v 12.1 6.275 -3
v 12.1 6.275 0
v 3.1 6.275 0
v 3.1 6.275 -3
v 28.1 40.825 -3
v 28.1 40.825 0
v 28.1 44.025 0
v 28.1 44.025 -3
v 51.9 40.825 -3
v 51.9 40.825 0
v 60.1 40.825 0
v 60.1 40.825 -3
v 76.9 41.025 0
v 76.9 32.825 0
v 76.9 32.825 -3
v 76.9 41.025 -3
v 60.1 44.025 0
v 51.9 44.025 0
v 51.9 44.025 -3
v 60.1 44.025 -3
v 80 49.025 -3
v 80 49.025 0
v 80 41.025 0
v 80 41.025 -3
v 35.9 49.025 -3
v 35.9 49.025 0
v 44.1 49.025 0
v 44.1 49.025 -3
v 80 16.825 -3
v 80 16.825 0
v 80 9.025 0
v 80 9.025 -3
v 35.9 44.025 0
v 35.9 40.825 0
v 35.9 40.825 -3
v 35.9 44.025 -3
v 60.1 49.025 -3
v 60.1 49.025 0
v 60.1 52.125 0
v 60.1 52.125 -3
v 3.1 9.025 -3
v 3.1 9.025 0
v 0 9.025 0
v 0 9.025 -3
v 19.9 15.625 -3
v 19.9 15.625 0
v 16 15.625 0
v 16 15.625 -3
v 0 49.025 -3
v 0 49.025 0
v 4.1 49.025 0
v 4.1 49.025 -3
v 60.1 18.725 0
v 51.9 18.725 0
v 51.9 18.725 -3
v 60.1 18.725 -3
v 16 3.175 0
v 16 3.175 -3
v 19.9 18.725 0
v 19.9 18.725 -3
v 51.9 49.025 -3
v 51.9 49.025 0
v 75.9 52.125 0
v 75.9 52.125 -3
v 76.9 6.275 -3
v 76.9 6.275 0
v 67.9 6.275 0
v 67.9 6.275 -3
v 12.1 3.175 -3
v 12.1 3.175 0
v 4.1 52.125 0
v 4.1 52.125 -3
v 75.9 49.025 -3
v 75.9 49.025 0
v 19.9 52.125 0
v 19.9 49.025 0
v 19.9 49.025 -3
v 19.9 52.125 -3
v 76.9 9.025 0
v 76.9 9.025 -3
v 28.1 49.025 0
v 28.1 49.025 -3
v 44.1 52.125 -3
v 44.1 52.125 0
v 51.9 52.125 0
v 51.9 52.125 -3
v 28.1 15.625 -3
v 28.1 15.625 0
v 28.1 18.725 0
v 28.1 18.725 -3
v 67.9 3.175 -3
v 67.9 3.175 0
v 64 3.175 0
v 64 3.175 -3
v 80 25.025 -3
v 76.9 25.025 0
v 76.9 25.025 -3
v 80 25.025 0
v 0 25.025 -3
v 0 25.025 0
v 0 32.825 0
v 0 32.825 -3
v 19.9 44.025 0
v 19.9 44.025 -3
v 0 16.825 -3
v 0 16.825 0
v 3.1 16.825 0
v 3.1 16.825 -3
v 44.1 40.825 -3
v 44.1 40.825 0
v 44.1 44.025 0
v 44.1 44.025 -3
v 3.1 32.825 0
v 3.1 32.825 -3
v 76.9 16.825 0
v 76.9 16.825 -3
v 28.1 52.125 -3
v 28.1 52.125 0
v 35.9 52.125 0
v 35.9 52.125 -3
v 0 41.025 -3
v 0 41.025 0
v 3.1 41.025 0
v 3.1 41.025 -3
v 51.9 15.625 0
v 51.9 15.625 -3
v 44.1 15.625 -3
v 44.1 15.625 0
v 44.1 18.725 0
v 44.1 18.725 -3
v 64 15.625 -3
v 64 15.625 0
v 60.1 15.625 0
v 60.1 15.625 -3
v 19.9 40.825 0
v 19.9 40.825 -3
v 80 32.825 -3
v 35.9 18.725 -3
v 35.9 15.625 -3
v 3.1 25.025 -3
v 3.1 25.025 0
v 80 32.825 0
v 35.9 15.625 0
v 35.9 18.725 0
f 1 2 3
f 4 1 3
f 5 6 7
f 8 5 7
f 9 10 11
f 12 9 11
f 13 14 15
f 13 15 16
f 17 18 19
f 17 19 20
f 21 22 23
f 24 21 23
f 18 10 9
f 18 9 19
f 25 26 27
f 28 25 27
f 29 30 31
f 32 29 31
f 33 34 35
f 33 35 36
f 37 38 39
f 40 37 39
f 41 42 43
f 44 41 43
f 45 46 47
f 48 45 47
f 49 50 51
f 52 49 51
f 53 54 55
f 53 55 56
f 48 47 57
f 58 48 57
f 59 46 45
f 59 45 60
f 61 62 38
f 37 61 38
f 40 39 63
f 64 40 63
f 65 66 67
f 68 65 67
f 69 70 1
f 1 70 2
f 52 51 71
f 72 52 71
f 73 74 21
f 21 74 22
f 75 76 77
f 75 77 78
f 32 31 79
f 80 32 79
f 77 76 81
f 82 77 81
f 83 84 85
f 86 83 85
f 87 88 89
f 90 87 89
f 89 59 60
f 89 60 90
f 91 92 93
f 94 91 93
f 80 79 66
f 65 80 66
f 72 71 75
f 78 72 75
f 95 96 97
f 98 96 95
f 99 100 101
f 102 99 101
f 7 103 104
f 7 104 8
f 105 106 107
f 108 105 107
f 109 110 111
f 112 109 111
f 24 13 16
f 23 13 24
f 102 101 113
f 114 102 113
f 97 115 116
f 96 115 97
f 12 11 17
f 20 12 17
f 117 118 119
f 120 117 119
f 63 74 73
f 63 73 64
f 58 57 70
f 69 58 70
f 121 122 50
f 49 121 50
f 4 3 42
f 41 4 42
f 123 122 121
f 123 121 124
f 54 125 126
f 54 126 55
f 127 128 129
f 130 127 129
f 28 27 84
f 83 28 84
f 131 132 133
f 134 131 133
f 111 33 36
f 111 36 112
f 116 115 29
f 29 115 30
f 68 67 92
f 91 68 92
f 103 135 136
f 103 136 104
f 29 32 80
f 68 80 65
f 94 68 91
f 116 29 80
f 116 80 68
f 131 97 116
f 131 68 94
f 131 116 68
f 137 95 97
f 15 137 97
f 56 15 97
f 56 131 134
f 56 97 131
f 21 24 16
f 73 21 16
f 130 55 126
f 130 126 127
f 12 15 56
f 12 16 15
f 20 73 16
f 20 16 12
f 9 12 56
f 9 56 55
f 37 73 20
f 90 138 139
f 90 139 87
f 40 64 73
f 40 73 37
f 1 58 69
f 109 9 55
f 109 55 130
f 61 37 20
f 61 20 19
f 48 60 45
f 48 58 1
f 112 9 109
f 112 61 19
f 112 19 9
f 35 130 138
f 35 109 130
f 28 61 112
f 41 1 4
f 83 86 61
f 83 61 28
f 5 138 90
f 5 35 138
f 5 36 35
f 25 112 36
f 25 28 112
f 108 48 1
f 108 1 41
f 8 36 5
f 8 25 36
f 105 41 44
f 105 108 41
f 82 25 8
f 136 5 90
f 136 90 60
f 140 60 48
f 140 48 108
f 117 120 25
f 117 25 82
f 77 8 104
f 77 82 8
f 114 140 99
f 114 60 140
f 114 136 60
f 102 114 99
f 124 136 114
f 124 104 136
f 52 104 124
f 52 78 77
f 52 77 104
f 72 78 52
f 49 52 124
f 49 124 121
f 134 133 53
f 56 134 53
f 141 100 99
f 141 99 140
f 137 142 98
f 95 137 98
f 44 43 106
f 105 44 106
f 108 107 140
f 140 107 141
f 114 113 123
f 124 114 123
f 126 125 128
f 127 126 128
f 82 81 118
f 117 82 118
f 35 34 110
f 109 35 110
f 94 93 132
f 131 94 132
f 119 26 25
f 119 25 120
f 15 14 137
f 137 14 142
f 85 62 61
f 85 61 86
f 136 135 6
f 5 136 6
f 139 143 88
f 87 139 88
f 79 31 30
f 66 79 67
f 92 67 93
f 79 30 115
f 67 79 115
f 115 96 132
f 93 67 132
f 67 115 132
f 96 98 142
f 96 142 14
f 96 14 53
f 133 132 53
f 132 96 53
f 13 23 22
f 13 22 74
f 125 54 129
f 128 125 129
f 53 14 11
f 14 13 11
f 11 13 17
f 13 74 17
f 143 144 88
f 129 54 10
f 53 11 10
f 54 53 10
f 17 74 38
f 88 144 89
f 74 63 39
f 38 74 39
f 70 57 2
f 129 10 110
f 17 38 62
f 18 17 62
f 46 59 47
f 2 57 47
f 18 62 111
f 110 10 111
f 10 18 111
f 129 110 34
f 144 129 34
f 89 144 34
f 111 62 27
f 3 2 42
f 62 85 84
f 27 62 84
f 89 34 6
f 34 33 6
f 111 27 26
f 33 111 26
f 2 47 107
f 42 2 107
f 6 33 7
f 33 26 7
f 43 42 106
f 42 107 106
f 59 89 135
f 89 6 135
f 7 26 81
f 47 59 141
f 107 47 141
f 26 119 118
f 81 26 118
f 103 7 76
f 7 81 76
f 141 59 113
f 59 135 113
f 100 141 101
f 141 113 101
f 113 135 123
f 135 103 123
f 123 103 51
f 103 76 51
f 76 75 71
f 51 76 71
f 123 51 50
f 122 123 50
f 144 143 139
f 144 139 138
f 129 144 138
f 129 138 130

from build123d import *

# Parameters (mm, degrees)
BOSS_EXTRUDE1_DEPTH = 3
SKETCH3_W           = 4.2
SKETCH3_H           = 3.2
SKETCH3_W_2         = 3.2
SKETCH3_H_2         = 8.2
SKETCH3_W_3         = 8.2
CUT_EXTRUDE1_DEPTH  = 4


with BuildPart() as part:
    # Sketch1 → Boss-Extrude1 (new body)
    with BuildSketch(Plane.XY):
        Polygon((0, 52.125), (80, 52.125), (80, 3.175), (64, 3.175), (64, 15.625), (16, 15.625), (16, 3.175), (0, 3.175), align=None)
    extrude(amount=-BOSS_EXTRUDE1_DEPTH)

    # Sketch3 → Cut-Extrude1 (cut, through all)
    with BuildSketch(Plane.XY):
        with Locations((2, 50.625)):
            Rectangle(SKETCH3_W, SKETCH3_H)
        with Locations((1.5, 20.925)):
            Rectangle(SKETCH3_W_2, SKETCH3_H_2)
        with Locations((24, 17.125)):
            Rectangle(SKETCH3_W_3, SKETCH3_H)
        with Locations((40, 17.125)):
            Rectangle(SKETCH3_W_3, SKETCH3_H)
        with Locations((1.5, 36.925)):
            Rectangle(SKETCH3_W_2, SKETCH3_H_2)
        with Locations((40, 50.625)):
            Rectangle(SKETCH3_W_3, SKETCH3_H)
        with Locations((40, 42.425)):
            Rectangle(SKETCH3_W_3, SKETCH3_H)
        with Locations((24, 42.425)):
            Rectangle(SKETCH3_W_3, SKETCH3_H)
        with Locations((24, 50.625)):
            Rectangle(SKETCH3_W_3, SKETCH3_H)
        with Locations((56, 42.425)):
            Rectangle(SKETCH3_W_3, SKETCH3_H)
        with Locations((56, 17.125)):
            Rectangle(SKETCH3_W_3, SKETCH3_H)
        with Locations((78.5, 36.925)):
            Rectangle(SKETCH3_W_2, SKETCH3_H_2)
        with Locations((78, 50.625)):
            Rectangle(SKETCH3_W, SKETCH3_H)
        with Locations((78.5, 20.925)):
            Rectangle(SKETCH3_W_2, SKETCH3_H_2)
        with Locations((56, 50.625)):
            Rectangle(SKETCH3_W_3, SKETCH3_H)
        Polygon((76.9, 9.025), (76.9, 6.275), (67.9, 6.275), (67.9, 3.075), (80.1, 3.075), (80.1, 9.025), align=None)
        Polygon((3.1, 6.275), (3.1, 9.025), (-0.1, 9.025), (-0.1, 3.075), (12.1, 3.075), (12.1, 6.275), align=None)
    extrude(amount=-CUT_EXTRUDE1_DEPTH, mode=Mode.SUBTRACT)


solid = part.part
